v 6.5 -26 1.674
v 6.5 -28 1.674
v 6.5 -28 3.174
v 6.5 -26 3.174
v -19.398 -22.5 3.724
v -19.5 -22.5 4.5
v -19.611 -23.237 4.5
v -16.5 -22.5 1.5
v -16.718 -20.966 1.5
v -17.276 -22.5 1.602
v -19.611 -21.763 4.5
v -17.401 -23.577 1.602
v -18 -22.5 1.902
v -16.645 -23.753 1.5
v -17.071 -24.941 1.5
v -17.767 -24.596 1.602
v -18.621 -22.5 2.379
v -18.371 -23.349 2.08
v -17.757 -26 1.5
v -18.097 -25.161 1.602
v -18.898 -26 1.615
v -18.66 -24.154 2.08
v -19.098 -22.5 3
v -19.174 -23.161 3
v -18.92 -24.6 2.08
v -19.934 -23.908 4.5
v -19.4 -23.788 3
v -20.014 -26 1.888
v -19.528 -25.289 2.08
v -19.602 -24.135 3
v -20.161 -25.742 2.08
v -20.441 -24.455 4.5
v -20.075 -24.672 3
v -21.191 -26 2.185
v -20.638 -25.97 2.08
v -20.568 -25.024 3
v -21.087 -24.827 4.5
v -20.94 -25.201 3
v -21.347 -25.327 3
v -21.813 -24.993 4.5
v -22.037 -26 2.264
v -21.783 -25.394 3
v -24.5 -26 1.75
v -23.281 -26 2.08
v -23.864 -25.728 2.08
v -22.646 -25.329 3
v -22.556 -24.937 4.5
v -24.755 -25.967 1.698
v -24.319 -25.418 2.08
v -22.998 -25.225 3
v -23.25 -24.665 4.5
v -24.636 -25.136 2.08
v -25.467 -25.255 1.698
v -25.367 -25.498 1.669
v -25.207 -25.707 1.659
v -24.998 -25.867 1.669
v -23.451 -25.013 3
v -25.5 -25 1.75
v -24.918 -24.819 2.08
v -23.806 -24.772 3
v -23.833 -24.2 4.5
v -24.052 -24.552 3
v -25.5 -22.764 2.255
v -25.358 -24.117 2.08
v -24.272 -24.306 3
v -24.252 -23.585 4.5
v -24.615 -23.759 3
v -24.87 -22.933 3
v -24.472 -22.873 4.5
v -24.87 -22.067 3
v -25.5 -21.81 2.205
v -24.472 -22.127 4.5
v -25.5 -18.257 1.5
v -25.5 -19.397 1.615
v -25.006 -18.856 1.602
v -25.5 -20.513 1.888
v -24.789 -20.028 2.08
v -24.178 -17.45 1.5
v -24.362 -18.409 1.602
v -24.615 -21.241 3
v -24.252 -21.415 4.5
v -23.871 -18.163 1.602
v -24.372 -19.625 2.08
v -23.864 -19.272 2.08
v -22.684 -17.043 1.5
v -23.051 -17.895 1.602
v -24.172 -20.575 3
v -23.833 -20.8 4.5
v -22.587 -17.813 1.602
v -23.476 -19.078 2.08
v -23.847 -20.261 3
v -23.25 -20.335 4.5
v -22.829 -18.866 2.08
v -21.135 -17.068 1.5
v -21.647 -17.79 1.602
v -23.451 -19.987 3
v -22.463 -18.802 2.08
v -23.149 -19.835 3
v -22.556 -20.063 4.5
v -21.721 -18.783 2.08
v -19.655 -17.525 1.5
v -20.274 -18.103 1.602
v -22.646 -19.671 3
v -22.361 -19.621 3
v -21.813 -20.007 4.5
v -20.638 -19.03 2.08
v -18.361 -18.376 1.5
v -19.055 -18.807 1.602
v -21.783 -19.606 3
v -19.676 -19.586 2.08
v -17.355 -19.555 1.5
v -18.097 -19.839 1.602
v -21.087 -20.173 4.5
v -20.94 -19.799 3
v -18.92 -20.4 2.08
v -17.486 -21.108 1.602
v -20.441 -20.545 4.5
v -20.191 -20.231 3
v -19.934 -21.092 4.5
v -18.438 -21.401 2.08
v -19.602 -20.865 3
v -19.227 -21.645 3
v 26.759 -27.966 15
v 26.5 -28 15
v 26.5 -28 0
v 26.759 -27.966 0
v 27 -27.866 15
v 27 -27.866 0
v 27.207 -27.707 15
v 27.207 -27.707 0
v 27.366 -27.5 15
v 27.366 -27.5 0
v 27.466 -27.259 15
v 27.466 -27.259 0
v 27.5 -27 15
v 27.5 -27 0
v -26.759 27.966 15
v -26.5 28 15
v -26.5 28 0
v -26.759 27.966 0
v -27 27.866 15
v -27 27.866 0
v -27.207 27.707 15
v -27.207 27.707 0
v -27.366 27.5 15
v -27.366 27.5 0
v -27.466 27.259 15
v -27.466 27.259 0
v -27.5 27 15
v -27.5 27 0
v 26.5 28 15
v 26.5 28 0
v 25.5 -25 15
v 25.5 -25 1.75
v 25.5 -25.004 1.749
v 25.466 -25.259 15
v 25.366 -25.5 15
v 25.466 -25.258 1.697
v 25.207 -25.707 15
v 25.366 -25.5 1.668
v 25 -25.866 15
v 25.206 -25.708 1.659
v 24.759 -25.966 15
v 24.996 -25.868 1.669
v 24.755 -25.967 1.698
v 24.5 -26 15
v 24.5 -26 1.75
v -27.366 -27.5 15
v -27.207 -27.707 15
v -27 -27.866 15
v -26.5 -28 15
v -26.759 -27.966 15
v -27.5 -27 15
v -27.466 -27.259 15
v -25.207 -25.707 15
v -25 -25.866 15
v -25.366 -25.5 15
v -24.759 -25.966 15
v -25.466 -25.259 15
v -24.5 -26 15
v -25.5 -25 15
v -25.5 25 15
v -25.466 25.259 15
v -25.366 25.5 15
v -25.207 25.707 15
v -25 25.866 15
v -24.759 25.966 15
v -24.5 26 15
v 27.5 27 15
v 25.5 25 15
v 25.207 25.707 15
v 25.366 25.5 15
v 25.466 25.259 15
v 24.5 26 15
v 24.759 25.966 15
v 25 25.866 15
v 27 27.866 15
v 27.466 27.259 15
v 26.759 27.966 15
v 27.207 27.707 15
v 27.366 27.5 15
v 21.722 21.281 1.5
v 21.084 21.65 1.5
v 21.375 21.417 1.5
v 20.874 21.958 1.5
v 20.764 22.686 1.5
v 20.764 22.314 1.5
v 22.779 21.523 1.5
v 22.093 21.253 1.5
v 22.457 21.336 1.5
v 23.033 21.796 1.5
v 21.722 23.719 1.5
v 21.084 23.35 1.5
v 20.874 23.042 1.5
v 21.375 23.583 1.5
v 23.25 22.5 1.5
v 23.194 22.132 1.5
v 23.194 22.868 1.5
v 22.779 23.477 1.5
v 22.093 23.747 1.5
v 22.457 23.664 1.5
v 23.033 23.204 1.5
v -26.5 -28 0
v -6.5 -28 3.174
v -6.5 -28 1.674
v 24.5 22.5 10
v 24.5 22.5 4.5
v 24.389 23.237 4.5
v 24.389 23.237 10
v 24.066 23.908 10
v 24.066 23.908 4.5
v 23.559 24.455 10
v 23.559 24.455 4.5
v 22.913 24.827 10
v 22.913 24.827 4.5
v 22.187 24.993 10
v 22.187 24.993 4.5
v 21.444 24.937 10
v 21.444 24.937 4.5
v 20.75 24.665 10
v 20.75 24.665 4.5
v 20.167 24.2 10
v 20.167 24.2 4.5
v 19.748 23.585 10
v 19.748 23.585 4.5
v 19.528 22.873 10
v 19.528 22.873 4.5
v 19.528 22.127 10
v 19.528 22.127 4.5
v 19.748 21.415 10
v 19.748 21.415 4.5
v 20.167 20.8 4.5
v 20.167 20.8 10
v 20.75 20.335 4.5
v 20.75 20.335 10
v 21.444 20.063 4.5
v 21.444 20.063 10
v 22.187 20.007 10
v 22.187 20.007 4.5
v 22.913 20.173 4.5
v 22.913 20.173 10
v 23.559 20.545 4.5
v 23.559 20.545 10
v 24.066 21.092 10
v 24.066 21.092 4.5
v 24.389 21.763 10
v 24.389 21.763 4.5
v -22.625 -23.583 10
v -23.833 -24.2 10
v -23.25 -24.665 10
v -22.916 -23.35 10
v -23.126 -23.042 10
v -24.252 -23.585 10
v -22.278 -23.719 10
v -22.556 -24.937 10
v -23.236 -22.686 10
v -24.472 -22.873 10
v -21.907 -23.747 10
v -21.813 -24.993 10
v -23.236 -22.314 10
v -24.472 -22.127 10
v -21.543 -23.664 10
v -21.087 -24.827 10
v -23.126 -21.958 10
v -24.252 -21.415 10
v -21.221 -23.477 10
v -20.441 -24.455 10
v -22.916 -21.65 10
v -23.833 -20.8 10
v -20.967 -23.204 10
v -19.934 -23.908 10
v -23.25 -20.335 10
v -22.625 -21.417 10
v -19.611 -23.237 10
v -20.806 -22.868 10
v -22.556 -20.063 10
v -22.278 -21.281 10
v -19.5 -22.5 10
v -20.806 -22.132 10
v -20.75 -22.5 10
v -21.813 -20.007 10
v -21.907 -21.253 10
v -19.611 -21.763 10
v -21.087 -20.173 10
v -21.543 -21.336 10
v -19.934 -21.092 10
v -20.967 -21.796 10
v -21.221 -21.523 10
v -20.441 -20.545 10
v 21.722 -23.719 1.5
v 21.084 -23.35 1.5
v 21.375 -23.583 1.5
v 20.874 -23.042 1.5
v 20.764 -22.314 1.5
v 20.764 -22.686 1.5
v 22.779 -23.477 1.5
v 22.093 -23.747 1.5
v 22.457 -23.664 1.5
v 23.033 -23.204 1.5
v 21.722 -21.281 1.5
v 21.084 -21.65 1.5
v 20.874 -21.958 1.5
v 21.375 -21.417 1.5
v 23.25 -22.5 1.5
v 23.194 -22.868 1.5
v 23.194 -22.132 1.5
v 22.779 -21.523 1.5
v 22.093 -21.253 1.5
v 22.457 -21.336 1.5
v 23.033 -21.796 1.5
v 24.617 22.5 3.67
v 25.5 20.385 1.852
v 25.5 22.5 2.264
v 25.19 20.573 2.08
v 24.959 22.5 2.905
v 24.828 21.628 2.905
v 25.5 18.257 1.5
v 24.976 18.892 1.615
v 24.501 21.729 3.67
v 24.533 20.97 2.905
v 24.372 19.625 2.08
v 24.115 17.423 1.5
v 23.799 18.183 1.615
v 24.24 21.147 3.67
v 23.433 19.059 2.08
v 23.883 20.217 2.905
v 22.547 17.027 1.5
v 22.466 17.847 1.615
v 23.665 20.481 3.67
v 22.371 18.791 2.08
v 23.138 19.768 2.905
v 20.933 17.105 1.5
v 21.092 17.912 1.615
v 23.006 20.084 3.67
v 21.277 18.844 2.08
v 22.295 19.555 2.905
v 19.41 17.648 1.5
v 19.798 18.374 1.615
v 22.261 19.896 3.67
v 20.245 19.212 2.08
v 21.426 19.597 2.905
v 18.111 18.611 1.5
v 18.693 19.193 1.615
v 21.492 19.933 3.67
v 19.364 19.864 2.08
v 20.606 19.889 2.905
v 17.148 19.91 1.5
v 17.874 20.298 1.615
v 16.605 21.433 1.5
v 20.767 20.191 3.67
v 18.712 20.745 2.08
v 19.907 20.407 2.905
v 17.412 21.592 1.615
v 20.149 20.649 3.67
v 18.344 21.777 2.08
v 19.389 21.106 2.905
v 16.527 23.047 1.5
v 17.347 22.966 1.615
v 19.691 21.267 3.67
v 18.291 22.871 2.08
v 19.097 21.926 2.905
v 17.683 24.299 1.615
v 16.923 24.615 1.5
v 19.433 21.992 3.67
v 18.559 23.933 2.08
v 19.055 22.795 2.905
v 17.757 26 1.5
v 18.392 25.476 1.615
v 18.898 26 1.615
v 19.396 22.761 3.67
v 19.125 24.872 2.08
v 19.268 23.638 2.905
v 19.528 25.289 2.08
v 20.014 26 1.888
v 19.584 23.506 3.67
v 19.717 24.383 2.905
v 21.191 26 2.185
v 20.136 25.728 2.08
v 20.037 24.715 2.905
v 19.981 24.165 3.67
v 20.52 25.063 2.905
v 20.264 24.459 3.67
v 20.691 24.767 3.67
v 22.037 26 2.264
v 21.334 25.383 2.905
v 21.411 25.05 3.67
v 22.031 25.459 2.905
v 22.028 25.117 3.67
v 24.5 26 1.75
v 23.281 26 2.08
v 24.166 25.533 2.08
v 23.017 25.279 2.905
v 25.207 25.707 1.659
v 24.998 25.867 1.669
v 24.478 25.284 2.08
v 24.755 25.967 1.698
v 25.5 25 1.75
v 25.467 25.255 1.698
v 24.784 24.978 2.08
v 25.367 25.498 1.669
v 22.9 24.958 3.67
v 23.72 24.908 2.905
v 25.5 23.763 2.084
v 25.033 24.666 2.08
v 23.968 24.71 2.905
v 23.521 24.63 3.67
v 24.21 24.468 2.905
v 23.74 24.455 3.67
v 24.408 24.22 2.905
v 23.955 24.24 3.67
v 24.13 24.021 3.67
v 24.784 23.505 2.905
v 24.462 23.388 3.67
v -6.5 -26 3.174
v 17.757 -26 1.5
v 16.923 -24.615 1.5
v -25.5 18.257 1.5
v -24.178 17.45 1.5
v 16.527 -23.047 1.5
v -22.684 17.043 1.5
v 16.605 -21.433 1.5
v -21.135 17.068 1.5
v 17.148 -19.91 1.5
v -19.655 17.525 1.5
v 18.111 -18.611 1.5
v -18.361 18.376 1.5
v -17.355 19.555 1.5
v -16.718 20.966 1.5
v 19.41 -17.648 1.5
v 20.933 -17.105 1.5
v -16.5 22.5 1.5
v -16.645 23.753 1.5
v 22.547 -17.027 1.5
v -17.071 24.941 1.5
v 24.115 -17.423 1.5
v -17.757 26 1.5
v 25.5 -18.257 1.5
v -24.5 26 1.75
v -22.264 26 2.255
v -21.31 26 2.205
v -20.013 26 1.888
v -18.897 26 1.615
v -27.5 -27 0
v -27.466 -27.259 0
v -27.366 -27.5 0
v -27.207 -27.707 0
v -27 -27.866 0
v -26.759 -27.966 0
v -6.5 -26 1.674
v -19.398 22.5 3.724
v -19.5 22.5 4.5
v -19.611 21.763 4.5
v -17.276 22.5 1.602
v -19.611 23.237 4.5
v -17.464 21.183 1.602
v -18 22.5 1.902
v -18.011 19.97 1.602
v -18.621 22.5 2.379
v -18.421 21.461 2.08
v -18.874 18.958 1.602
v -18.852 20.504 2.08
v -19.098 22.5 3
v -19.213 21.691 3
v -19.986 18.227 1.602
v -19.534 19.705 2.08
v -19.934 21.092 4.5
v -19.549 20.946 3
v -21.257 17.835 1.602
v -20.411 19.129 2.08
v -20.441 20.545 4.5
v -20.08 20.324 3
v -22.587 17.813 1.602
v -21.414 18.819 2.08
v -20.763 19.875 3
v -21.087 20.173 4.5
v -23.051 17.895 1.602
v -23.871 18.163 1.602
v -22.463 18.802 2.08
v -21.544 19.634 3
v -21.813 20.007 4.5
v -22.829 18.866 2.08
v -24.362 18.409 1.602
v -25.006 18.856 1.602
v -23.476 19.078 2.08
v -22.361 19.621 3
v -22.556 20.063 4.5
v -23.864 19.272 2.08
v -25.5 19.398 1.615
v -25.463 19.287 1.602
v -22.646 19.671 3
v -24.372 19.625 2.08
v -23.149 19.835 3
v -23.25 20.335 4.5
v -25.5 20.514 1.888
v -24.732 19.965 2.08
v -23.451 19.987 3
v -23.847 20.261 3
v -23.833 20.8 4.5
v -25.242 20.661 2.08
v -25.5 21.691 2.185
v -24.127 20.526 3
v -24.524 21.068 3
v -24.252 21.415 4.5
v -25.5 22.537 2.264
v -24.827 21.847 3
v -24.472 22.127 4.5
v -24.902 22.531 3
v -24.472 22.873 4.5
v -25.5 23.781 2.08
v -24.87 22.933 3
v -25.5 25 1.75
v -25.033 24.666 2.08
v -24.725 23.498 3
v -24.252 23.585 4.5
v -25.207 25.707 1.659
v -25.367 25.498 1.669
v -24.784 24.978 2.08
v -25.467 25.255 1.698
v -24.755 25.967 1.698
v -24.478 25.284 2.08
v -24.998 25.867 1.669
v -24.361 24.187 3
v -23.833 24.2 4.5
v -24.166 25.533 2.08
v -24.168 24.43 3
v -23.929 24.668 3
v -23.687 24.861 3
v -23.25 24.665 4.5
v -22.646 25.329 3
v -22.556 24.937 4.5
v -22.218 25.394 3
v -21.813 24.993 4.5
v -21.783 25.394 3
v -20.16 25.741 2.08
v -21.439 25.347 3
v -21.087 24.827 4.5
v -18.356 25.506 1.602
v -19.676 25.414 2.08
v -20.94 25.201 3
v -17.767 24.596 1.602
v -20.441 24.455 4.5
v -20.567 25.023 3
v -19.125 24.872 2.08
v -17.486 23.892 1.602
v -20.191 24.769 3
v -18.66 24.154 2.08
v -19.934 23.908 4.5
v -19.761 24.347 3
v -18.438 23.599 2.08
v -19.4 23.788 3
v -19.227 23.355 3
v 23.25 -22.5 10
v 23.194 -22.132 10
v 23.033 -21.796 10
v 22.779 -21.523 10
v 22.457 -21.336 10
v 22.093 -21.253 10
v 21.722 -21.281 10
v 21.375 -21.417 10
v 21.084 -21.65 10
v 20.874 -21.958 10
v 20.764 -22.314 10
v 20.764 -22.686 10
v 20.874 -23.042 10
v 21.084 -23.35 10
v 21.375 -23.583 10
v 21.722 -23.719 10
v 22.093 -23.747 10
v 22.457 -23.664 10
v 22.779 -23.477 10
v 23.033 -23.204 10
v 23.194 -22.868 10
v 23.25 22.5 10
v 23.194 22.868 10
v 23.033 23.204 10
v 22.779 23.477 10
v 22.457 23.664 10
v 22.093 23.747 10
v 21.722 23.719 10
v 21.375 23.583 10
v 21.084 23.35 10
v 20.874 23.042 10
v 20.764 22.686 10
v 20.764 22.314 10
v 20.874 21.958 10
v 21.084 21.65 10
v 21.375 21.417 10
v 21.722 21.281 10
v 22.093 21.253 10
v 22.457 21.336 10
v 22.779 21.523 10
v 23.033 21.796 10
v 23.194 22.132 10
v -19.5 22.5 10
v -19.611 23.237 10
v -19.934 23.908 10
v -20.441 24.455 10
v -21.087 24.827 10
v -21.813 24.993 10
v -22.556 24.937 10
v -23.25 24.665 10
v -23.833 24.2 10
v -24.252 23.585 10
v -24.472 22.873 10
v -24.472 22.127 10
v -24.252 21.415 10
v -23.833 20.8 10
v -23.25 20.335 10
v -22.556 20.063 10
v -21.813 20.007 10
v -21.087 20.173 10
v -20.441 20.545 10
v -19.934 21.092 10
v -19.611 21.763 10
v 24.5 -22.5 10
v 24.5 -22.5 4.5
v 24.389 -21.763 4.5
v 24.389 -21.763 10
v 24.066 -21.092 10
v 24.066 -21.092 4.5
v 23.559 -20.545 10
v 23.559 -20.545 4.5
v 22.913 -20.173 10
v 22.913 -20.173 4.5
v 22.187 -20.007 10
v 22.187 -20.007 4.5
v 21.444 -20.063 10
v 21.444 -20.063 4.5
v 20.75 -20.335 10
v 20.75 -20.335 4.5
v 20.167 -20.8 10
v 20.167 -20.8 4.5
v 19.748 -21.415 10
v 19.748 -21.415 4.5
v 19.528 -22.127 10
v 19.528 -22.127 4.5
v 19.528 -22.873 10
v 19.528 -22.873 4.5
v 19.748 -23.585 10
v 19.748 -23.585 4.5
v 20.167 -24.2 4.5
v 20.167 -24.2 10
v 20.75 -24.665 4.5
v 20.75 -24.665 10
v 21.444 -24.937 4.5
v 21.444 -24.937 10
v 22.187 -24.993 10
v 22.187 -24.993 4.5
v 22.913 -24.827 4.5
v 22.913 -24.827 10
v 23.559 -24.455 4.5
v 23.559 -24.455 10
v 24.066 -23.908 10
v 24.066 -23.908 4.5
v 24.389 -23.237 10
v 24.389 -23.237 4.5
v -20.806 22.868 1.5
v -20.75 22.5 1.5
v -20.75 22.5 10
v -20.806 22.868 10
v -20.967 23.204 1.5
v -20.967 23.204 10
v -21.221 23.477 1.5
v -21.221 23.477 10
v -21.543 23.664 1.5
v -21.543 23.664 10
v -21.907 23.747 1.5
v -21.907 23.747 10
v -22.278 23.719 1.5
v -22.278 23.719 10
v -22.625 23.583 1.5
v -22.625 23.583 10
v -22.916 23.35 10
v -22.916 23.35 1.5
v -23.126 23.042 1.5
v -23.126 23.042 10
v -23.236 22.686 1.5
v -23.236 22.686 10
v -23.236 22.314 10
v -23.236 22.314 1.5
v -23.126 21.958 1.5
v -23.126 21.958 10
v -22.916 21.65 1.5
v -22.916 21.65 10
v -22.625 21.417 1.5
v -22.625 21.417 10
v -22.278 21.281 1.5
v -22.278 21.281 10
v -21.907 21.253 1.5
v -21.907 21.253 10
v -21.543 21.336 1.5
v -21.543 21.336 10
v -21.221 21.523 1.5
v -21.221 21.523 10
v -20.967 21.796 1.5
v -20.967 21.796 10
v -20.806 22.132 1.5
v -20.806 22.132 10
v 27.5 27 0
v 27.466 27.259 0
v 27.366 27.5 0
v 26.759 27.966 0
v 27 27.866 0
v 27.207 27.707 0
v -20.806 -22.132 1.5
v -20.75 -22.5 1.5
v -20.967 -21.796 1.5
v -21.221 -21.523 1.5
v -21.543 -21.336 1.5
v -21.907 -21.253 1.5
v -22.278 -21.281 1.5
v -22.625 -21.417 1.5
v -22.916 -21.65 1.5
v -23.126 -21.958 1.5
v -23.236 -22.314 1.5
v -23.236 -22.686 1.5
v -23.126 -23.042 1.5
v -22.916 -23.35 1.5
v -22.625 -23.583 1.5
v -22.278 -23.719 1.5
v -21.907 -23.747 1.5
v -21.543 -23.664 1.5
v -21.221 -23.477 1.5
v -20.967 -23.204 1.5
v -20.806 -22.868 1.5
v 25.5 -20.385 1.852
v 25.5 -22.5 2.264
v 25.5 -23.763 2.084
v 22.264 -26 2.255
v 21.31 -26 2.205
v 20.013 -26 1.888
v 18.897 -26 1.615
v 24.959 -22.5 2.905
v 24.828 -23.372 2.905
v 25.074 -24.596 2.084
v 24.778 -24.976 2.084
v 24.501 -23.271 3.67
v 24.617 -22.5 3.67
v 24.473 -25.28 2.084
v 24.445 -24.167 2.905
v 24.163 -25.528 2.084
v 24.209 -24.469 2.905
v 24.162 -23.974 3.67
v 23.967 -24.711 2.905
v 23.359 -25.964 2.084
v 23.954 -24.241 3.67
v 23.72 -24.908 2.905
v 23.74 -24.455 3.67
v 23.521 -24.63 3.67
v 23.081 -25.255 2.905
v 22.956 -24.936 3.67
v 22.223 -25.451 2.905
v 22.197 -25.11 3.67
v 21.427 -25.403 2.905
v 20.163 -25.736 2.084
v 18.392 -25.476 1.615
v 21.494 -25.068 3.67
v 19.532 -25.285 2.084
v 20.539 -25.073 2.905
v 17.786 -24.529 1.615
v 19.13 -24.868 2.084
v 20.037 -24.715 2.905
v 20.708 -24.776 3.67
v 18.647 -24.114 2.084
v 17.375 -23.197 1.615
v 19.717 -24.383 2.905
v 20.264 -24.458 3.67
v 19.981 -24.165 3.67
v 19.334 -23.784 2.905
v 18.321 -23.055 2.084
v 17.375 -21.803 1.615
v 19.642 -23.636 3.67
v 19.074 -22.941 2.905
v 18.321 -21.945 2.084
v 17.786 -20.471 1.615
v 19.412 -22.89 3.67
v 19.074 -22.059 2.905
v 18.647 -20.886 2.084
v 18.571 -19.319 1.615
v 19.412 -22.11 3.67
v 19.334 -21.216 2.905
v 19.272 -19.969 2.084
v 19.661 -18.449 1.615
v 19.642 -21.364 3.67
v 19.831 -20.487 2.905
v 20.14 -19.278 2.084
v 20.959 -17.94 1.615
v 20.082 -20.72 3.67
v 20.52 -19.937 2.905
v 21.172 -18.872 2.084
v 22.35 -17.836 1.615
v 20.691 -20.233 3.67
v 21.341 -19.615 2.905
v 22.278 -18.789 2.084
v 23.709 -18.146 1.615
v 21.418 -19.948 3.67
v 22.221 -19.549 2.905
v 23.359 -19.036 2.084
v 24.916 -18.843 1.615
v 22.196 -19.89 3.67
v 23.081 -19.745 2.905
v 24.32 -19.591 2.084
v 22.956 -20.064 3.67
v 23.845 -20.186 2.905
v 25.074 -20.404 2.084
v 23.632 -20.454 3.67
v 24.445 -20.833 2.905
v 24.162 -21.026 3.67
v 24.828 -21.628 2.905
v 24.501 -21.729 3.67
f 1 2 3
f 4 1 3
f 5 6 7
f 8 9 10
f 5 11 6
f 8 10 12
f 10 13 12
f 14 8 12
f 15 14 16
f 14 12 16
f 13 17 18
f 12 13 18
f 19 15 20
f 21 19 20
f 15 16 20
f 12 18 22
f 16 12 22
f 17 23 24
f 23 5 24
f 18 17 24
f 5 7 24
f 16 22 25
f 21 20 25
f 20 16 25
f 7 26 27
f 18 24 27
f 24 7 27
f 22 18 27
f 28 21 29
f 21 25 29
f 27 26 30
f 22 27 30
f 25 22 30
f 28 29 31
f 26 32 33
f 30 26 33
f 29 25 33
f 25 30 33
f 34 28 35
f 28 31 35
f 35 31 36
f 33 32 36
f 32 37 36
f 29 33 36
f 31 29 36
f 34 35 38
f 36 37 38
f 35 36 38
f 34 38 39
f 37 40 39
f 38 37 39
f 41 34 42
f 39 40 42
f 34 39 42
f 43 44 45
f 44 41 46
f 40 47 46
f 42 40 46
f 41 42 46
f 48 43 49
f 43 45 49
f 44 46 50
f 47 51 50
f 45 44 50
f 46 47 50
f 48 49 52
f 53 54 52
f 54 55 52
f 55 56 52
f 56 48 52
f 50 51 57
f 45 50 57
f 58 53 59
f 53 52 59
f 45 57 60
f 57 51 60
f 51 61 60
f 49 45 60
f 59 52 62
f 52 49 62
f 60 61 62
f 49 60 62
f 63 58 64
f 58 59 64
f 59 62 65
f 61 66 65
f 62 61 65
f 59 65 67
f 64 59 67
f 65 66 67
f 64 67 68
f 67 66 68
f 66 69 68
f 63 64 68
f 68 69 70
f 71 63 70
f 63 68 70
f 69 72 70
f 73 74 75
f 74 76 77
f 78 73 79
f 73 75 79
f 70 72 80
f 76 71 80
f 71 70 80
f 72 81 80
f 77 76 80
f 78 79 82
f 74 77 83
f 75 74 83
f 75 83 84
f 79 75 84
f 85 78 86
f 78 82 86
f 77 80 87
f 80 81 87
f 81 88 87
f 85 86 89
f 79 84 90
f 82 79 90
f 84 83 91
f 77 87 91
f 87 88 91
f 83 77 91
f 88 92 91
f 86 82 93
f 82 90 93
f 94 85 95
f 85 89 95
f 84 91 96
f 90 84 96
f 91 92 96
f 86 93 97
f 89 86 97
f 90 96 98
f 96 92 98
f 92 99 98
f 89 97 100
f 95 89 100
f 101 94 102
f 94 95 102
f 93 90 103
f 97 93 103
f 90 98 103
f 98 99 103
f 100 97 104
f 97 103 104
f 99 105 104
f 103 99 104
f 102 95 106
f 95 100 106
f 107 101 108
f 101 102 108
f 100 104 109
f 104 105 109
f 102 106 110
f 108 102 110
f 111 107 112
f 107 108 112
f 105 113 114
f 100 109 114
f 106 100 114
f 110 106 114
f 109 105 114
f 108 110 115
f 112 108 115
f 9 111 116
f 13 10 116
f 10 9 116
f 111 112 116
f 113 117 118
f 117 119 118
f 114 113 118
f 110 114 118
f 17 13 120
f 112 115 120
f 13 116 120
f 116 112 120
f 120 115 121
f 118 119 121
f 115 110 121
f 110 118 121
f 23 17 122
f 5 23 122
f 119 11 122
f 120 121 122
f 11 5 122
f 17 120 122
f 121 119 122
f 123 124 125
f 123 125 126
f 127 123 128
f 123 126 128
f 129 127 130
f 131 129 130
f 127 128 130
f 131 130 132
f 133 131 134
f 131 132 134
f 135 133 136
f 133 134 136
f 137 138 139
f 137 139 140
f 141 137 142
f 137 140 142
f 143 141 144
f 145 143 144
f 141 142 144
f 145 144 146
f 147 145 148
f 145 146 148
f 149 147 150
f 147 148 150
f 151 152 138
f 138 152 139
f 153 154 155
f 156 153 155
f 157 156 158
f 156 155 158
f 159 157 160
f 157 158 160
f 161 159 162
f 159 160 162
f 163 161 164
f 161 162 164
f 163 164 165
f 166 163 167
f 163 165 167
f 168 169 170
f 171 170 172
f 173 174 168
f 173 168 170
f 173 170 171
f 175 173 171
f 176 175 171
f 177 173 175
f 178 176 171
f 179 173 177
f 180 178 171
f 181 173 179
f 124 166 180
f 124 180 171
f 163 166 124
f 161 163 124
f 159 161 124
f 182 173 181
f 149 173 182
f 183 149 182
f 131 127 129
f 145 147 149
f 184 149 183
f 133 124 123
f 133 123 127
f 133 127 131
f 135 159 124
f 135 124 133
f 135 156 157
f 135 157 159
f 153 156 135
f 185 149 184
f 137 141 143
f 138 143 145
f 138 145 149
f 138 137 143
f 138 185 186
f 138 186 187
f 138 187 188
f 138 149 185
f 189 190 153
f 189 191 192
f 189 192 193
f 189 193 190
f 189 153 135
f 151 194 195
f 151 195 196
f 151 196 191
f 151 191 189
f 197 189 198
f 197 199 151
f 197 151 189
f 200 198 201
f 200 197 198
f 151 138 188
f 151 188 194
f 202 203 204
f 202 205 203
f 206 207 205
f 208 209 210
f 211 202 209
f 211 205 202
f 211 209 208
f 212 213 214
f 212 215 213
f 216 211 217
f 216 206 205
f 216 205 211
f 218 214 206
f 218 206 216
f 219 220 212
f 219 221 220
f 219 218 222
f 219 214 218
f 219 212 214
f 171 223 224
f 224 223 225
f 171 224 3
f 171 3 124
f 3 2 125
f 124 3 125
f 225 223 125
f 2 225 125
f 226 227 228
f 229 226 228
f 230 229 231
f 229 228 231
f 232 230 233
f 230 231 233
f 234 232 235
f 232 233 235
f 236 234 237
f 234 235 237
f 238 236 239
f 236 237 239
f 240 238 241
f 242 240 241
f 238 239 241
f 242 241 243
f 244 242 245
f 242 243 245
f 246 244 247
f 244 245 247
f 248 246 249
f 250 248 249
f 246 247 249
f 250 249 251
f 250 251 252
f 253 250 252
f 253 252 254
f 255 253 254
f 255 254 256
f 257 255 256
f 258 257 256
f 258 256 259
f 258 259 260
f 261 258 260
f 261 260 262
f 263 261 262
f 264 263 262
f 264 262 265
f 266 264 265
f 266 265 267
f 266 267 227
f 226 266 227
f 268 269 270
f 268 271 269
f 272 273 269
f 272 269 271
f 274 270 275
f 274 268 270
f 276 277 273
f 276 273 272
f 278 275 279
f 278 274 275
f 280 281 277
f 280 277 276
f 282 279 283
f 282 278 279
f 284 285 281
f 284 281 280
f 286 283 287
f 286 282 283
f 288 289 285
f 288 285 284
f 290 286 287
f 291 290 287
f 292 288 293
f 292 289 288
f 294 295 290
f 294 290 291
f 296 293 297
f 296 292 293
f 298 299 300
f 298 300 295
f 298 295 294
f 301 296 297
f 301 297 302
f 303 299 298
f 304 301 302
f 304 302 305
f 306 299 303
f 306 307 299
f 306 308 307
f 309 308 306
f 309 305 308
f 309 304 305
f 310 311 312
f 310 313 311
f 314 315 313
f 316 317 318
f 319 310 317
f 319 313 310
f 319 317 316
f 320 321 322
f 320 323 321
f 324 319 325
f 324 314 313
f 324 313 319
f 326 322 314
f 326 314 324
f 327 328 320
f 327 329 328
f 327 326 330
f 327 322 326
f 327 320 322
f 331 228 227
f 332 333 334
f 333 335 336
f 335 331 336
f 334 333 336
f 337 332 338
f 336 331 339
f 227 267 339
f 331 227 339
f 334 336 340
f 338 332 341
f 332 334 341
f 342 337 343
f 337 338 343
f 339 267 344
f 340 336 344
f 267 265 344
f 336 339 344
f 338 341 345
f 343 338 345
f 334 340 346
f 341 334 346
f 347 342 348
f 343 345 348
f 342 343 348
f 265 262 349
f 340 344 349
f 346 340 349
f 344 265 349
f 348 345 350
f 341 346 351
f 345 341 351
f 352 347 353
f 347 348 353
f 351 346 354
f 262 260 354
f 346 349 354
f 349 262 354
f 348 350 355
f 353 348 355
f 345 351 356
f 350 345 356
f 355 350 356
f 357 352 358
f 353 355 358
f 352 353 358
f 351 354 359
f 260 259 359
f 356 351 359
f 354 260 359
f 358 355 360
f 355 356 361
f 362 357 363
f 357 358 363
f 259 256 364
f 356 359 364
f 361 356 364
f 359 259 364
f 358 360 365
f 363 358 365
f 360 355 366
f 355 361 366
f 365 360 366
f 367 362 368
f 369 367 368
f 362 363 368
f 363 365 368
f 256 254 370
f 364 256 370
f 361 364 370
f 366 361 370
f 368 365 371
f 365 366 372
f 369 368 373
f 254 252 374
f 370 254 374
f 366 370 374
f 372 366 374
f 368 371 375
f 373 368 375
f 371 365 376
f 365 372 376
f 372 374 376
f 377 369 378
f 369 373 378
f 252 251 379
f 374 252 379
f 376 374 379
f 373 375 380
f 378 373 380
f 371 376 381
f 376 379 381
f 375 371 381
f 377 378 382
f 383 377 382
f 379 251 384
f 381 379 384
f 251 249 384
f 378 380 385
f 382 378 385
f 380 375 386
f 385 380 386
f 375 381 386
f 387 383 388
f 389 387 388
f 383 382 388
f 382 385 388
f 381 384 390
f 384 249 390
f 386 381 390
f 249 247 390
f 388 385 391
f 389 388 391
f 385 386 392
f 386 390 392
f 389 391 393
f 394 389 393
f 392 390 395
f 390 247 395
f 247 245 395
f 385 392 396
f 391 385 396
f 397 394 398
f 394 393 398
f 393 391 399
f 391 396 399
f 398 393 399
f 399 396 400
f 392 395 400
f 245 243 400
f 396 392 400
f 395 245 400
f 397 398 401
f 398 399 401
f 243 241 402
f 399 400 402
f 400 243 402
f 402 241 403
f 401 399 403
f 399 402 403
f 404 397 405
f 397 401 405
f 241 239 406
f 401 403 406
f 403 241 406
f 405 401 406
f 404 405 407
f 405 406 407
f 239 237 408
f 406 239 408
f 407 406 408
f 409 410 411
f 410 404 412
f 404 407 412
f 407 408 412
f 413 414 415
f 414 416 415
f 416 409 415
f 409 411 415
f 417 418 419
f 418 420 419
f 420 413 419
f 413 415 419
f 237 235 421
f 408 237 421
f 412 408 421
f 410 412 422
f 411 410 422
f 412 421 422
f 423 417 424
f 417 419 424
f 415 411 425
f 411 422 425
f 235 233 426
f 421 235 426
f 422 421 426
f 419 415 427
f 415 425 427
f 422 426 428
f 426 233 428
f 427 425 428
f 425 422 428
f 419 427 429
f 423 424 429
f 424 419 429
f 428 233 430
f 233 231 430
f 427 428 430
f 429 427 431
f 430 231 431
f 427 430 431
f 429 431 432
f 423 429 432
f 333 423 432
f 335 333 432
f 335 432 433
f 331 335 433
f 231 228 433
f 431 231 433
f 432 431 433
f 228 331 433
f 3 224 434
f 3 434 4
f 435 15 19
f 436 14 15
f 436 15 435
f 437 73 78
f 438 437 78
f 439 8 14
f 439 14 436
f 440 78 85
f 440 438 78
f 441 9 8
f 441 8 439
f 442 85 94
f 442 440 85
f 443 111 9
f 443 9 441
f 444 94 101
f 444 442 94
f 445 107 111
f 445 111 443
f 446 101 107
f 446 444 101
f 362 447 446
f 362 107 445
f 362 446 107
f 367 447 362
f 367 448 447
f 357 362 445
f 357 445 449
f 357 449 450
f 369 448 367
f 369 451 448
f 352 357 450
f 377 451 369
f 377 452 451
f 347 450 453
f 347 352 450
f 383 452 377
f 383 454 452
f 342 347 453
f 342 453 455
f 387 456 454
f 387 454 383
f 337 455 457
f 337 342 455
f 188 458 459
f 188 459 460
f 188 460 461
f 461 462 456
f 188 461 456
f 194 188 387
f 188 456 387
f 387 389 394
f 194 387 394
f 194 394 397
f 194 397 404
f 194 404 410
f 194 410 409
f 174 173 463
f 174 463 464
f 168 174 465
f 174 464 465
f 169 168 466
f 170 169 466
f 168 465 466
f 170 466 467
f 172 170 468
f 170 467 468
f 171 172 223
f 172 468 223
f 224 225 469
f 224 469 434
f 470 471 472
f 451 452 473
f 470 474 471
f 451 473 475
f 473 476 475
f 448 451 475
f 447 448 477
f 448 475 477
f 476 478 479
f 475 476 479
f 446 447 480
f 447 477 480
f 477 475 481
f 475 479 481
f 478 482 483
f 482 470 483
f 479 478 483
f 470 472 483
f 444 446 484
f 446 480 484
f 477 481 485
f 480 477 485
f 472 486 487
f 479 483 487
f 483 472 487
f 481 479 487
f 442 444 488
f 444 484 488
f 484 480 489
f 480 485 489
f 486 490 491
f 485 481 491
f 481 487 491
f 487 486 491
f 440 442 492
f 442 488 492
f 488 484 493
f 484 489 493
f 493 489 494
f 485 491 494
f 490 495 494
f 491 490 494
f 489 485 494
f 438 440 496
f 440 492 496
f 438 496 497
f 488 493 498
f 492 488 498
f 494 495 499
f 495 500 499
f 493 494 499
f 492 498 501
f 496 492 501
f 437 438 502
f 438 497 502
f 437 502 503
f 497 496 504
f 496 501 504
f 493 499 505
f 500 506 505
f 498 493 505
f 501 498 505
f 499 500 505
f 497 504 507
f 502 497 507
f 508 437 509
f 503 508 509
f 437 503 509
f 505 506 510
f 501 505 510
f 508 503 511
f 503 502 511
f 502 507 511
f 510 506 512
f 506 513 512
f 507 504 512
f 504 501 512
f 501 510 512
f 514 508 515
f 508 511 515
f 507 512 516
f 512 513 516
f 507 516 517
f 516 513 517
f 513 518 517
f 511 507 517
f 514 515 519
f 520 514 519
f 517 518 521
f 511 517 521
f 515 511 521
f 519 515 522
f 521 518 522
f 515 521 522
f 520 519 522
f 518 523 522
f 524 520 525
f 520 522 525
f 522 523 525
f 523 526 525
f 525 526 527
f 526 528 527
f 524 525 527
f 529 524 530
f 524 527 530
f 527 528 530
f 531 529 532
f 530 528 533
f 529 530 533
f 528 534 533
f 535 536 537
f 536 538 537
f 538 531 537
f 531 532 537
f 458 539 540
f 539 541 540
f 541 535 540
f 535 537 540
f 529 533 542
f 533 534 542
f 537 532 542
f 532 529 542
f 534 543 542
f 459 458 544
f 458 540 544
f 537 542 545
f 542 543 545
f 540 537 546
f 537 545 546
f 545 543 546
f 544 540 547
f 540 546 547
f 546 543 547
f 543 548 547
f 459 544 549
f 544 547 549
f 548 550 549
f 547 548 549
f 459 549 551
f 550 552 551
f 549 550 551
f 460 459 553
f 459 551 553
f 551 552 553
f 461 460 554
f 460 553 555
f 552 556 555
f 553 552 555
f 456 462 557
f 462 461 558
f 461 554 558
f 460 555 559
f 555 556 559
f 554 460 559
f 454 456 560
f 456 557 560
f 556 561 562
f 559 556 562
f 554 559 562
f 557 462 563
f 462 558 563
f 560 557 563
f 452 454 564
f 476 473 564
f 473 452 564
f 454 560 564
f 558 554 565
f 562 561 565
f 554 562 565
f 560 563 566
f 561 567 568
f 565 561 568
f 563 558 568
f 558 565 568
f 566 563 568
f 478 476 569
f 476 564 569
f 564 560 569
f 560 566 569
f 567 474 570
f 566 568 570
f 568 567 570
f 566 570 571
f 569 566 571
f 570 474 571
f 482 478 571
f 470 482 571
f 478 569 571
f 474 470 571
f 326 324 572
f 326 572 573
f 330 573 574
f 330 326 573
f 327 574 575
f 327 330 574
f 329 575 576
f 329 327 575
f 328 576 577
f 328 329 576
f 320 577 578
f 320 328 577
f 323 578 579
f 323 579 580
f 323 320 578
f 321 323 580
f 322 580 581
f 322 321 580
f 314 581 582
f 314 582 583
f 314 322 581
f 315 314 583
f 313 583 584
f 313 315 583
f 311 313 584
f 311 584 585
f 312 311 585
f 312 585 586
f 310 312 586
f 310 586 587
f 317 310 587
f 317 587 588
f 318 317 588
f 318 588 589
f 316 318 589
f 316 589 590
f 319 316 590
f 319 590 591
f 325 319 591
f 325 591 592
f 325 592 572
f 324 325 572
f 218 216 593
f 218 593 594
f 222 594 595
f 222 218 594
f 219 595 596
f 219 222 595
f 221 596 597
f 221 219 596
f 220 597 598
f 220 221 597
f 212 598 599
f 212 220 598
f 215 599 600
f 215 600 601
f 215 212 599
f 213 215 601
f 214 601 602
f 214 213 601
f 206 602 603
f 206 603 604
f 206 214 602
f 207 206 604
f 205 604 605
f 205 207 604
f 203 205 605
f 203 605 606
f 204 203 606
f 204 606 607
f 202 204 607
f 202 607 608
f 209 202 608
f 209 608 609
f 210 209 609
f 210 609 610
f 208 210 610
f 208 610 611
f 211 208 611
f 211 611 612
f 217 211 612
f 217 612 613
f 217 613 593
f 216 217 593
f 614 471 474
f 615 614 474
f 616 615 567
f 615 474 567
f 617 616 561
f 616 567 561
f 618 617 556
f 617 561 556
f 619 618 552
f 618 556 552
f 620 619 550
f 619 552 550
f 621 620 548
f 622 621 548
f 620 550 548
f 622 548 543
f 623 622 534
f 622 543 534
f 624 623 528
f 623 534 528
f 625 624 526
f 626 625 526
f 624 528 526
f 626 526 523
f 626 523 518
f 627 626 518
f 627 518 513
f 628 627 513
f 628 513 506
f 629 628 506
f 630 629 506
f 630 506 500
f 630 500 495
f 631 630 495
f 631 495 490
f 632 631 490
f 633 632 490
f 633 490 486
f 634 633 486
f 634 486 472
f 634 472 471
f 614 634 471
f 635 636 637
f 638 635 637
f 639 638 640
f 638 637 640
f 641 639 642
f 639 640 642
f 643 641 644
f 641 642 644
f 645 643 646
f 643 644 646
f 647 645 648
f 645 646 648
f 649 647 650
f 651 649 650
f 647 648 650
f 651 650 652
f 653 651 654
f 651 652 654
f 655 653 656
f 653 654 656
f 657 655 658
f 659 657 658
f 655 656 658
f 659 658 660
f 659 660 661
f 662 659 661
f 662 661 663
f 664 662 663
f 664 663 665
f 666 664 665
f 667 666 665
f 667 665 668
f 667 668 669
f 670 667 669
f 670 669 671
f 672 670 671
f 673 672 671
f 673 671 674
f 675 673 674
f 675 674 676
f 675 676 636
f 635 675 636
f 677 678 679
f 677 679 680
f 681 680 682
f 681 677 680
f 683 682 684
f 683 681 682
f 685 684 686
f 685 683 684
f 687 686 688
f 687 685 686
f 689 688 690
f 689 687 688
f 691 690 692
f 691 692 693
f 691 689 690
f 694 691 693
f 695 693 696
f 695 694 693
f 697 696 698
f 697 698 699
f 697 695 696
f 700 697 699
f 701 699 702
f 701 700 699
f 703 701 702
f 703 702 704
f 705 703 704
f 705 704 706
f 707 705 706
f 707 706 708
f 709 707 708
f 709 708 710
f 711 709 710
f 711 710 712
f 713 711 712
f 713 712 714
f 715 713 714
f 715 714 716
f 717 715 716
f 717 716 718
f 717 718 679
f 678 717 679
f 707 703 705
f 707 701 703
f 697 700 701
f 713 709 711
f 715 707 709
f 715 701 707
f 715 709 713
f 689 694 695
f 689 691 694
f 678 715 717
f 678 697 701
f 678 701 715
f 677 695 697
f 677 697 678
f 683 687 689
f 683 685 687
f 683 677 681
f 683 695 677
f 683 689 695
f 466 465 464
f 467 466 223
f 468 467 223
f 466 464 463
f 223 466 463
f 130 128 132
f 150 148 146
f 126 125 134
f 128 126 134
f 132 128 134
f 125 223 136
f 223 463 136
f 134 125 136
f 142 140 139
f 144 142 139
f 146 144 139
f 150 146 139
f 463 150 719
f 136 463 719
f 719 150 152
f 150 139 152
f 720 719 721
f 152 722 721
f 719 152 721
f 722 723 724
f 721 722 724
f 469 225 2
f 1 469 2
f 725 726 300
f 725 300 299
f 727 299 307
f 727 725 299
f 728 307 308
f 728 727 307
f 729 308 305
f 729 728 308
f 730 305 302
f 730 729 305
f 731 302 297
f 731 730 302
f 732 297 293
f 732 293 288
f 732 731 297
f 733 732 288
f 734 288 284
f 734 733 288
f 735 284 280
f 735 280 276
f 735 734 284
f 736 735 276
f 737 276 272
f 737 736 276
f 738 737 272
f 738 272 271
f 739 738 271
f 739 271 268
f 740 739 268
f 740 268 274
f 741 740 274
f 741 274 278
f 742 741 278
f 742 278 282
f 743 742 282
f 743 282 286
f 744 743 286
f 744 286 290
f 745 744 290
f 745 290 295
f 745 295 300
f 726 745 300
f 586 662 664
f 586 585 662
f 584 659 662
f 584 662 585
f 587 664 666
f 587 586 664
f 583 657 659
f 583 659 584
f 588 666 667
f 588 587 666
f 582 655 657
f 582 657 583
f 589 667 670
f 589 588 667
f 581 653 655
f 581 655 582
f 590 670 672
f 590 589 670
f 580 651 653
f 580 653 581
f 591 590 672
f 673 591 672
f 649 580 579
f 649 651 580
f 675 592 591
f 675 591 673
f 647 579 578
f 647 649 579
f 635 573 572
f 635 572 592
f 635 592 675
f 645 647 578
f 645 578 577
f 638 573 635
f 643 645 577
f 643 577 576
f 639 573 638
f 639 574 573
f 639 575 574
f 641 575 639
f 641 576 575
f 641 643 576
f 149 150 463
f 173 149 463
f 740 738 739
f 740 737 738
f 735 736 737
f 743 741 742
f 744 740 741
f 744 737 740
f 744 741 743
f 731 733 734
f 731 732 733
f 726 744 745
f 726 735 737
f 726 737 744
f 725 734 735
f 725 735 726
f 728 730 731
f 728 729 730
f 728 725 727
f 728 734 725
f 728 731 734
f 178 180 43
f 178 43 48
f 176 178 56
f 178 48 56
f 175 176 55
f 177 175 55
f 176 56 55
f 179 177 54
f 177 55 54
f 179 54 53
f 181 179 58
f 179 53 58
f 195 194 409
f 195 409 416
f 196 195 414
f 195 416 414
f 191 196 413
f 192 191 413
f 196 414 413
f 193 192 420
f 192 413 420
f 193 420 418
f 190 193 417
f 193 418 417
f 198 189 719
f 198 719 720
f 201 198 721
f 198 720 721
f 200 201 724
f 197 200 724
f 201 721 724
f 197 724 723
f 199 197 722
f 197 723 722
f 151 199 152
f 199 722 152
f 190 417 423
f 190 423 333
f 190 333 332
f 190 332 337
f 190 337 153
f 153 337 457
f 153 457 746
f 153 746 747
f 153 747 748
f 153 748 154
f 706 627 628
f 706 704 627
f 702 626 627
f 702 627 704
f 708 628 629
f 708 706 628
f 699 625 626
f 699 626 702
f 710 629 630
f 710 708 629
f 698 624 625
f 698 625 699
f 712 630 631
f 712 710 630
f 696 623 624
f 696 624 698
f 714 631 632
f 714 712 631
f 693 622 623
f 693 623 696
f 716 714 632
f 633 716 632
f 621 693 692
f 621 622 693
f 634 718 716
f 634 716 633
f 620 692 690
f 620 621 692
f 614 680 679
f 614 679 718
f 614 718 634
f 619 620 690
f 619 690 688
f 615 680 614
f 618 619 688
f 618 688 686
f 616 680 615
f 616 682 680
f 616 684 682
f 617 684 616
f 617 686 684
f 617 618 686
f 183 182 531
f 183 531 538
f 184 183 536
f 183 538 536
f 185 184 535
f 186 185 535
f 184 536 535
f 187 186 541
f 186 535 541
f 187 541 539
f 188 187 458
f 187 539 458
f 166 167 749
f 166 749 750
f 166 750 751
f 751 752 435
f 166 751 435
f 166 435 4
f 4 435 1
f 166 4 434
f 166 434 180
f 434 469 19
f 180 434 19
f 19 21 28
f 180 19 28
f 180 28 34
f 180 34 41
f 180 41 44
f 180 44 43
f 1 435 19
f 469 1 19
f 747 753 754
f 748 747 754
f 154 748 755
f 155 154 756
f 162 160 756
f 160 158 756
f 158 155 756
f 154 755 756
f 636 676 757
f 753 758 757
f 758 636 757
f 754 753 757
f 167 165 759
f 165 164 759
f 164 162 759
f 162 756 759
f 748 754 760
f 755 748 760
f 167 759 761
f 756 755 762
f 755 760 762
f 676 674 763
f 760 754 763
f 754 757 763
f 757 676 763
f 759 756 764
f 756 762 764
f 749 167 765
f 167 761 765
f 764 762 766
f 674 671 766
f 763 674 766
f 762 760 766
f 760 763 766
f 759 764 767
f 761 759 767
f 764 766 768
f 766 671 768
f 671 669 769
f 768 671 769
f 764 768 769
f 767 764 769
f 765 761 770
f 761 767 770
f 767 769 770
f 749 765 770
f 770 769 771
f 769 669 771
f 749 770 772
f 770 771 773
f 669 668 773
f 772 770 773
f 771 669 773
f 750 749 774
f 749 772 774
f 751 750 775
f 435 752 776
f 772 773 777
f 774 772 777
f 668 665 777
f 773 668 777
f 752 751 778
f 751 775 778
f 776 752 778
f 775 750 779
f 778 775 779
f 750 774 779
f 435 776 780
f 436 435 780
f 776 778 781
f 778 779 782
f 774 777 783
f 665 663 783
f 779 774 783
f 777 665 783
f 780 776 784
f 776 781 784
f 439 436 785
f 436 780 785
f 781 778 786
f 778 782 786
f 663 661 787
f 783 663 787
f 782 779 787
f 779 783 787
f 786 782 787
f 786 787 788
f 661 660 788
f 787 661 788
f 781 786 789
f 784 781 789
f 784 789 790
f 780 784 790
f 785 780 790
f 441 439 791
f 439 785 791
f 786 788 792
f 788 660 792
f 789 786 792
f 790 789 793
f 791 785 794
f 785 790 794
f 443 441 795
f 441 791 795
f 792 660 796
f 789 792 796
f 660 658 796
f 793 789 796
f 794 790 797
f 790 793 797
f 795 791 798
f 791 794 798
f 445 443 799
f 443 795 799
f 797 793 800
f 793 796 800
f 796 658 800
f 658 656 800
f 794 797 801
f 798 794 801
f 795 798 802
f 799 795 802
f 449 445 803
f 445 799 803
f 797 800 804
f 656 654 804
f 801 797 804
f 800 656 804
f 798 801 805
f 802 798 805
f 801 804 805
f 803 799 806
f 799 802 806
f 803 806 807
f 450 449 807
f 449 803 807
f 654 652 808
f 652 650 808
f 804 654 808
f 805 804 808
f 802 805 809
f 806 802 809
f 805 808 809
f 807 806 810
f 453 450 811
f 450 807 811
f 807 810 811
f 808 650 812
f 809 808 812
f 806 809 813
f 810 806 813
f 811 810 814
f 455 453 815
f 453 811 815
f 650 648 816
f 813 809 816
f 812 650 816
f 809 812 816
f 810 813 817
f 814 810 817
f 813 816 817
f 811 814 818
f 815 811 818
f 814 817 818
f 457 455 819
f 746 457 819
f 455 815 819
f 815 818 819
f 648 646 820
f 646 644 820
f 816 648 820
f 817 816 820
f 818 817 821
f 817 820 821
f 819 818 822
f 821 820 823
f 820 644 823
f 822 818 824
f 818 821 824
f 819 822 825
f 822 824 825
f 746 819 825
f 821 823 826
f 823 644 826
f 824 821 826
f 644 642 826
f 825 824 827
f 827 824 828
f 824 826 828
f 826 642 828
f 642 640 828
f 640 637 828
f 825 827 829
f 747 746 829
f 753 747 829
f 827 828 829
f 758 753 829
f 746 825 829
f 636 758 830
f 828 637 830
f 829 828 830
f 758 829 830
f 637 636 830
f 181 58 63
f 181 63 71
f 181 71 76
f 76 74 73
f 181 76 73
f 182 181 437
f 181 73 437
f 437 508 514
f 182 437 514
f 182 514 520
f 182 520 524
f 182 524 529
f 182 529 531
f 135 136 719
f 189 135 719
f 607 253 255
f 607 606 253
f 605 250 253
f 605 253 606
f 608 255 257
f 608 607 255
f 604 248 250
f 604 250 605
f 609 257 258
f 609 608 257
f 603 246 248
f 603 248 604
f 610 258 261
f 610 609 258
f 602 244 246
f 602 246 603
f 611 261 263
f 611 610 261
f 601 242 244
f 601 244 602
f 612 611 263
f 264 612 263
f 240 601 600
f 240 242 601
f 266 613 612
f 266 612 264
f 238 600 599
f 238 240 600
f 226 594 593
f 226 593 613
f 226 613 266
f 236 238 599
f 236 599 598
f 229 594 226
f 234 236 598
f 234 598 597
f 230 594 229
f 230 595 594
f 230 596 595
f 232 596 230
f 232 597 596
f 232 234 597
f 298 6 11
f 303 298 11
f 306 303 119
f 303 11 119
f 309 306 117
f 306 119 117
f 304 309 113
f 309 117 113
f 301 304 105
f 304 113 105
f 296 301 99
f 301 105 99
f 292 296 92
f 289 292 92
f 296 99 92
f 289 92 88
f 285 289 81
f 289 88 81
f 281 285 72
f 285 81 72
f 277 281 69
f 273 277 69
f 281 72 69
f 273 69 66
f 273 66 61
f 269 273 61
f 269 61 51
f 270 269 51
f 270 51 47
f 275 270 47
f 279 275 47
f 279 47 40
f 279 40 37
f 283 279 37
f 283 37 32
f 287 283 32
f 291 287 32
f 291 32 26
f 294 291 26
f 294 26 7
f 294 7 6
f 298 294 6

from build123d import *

# Parameters (mm, degrees)
F0_R     = 2.5
F0_R_2   = 1.25
F1_DEPTH = 1.5
F2_DEPTH = 15
F3_DEPTH = 10
F5_W     = 13
F5_H     = 1.5
F6_DEPTH = 5


# Not quite as in the source:
# - a fillet or chamfer that OpenCascade refuses, or shapes differently, is made with other operations: its cross-section is extruded or revolved along the edge and cut away or added


with BuildPart() as f1:
    # F0 (on Top) → F1 (new body)
    with BuildSketch(Plane.XY):
        with BuildLine():
            ThreePointArc((26.5, -28), (27.2071067812, -27.7071067812), (27.5, -27))
            Line((27.5, -27), (27.5, 27))
            ThreePointArc((27.5, 27), (27.2071067812, 27.7071067812), (26.5, 28))
            Line((26.5, 28), (-26.5, 28))
            ThreePointArc((-26.5, 28), (-27.2071067812, 27.7071067812), (-27.5, 27))
            Line((-27.5, 27), (-27.5, -27))
            ThreePointArc((-27.5, -27), (-27.2071067812, -27.7071067812), (-26.5, -28))
            Line((-26.5, -28), (26.5, -28))
        make_face()
        with BuildLine():
            ThreePointArc((25.5, -25), (25.2071067812, -25.7071067812), (24.5, -26))
            Line((24.5, -26), (-24.5, -26))
            ThreePointArc((-24.5, -26), (-25.2071067812, -25.7071067812), (-25.5, -25))
            Line((-25.5, -25), (-25.5, 25))
            ThreePointArc((-25.5, 25), (-25.2071067812, 25.7071067812), (-24.5, 26))
            Line((-24.5, 26), (24.5, 26))
            ThreePointArc((24.5, 26), (25.2071067812, 25.7071067812), (25.5, 25))
            Line((25.5, 25), (25.5, -25))
        make_face(mode=Mode.SUBTRACT)
        with BuildLine():
            Line((-24.5, -26), (24.5, -26))
            ThreePointArc((24.5, -26), (25.2071067812, -25.7071067812), (25.5, -25))
            Line((25.5, -25), (25.5, 25))
            ThreePointArc((25.5, 25), (25.2071067812, 25.7071067812), (24.5, 26))
            Line((24.5, 26), (-24.5, 26))
            ThreePointArc((-24.5, 26), (-25.2071067812, 25.7071067812), (-25.5, 25))
            Line((-25.5, 25), (-25.5, -25))
            ThreePointArc((-25.5, -25), (-25.2071067812, -25.7071067812), (-24.5, -26))
        make_face()
        with Locations((-22, -22.5)):
            Circle(F0_R, mode=Mode.SUBTRACT)
        with Locations((22, -22.5)):
            Circle(F0_R, mode=Mode.SUBTRACT)
        with Locations((-22, 22.5)):
            Circle(F0_R, mode=Mode.SUBTRACT)
        with Locations((22, 22.5)):
            Circle(F0_R, mode=Mode.SUBTRACT)
        with Locations((-22, -22.5)):
            Circle(F0_R)
        with Locations((-22, -22.5)):
            Circle(F0_R_2, mode=Mode.SUBTRACT)
        with Locations((22, -22.5)):
            Circle(F0_R)
        with Locations((22, -22.5)):
            Circle(F0_R_2, mode=Mode.SUBTRACT)
        with Locations((22, 22.5)):
            Circle(F0_R)
        with Locations((22, 22.5)):
            Circle(F0_R_2, mode=Mode.SUBTRACT)
        with Locations((-22, 22.5)):
            Circle(F0_R)
        with Locations((-22, 22.5)):
            Circle(F0_R_2, mode=Mode.SUBTRACT)
        with Locations((-22, -22.5)):
            Circle(F0_R_2)
        with Locations((22, -22.5)):
            Circle(F0_R_2)
        with Locations((22, 22.5)):
            Circle(F0_R_2)
        with Locations((-22, 22.5)):
            Circle(F0_R_2)
    extrude(amount=F1_DEPTH)

    # F0 (on Top) → F2 (join)
    with BuildSketch(Plane.XY):
        with BuildLine():
            ThreePointArc((26.5, -28), (27.2071067812, -27.7071067812), (27.5, -27))
            Line((27.5, -27), (27.5, 27))
            ThreePointArc((27.5, 27), (27.2071067812, 27.7071067812), (26.5, 28))
            Line((26.5, 28), (-26.5, 28))
            ThreePointArc((-26.5, 28), (-27.2071067812, 27.7071067812), (-27.5, 27))
            Line((-27.5, 27), (-27.5, -27))
            ThreePointArc((-27.5, -27), (-27.2071067812, -27.7071067812), (-26.5, -28))
            Line((-26.5, -28), (26.5, -28))
        make_face()
        with BuildLine():
            ThreePointArc((25.5, -25), (25.2071067812, -25.7071067812), (24.5, -26))
            Line((24.5, -26), (-24.5, -26))
            ThreePointArc((-24.5, -26), (-25.2071067812, -25.7071067812), (-25.5, -25))
            Line((-25.5, -25), (-25.5, 25))
            ThreePointArc((-25.5, 25), (-25.2071067812, 25.7071067812), (-24.5, 26))
            Line((-24.5, 26), (24.5, 26))
            ThreePointArc((24.5, 26), (25.2071067812, 25.7071067812), (25.5, 25))
            Line((25.5, 25), (25.5, -25))
        make_face(mode=Mode.SUBTRACT)
    extrude(amount=F2_DEPTH)

    # F0 (on Top) → F3 (join)
    with BuildSketch(Plane.XY):
        with Locations((22, 22.5)):
            Circle(F0_R)
        with Locations((22, 22.5)):
            Circle(F0_R_2, mode=Mode.SUBTRACT)
        with Locations((-22, 22.5)):
            Circle(F0_R)
        with Locations((-22, 22.5)):
            Circle(F0_R_2, mode=Mode.SUBTRACT)
        with Locations((-22, -22.5)):
            Circle(F0_R)
        with Locations((-22, -22.5)):
            Circle(F0_R_2, mode=Mode.SUBTRACT)
        with Locations((22, -22.5)):
            Circle(F0_R)
        with Locations((22, -22.5)):
            Circle(F0_R_2, mode=Mode.SUBTRACT)
    extrude(amount=F3_DEPTH)

    # F4: fillet of radius 3 on 4 edges, made by hand

    # F4_s1 → F4_t2 (revolve)
    with BuildSketch(Plane.XZ.offset(22.5)):
        with BuildLine():
            ThreePointArc((27.5, 1.5), (25.3786796564, 2.3786796564), (24.5, 4.5))
            Line((24.5, 4.5), (24.5, 1.5))
            Line((24.5, 1.5), (27.5, 1.5))
        make_face()
    revolve(axis=Axis((22, -22.5, 1.5), (0, 0, -1)))

    # F4_s3 → F4_t4 (revolve)
    with BuildSketch(Plane.XZ.offset(-22.5)):
        with BuildLine():
            ThreePointArc((-16.5, 1.5), (-18.6213203436, 2.3786796564), (-19.5, 4.5))
            Line((-19.5, 4.5), (-19.5, 1.5))
            Line((-19.5, 1.5), (-16.5, 1.5))
        make_face()
    revolve(axis=Axis((-22, 22.5, 1.5), (0, 0, -1)))

    # F4_s5 → F4_t6 (revolve)
    with BuildSketch(Plane.XZ.offset(22.5)):
        with BuildLine():
            ThreePointArc((-16.5, 1.5), (-18.6213203436, 2.3786796564), (-19.5, 4.5))
            Line((-19.5, 4.5), (-19.5, 1.5))
            Line((-19.5, 1.5), (-16.5, 1.5))
        make_face()
    revolve(axis=Axis((-22, -22.5, 1.5), (0, 0, -1)))

    # F4_s7 → F4_t8 (revolve)
    with BuildSketch(Plane.XZ.offset(-22.5)):
        with BuildLine():
            ThreePointArc((27.5, 1.5), (25.3786796564, 2.3786796564), (24.5, 4.5))
            Line((24.5, 4.5), (24.5, 1.5))
            Line((24.5, 1.5), (27.5, 1.5))
        make_face()
    revolve(axis=Axis((22, 22.5, 1.5), (0, 0, -1)))

    # F5 (on face) → F6 (cut)
    with BuildSketch(Plane.XZ.offset(28)):
        with Locations((0, 2.4238943588)):
            Rectangle(F5_W, F5_H)
    extrude(amount=-F6_DEPTH, mode=Mode.SUBTRACT)


solid = f1.part
